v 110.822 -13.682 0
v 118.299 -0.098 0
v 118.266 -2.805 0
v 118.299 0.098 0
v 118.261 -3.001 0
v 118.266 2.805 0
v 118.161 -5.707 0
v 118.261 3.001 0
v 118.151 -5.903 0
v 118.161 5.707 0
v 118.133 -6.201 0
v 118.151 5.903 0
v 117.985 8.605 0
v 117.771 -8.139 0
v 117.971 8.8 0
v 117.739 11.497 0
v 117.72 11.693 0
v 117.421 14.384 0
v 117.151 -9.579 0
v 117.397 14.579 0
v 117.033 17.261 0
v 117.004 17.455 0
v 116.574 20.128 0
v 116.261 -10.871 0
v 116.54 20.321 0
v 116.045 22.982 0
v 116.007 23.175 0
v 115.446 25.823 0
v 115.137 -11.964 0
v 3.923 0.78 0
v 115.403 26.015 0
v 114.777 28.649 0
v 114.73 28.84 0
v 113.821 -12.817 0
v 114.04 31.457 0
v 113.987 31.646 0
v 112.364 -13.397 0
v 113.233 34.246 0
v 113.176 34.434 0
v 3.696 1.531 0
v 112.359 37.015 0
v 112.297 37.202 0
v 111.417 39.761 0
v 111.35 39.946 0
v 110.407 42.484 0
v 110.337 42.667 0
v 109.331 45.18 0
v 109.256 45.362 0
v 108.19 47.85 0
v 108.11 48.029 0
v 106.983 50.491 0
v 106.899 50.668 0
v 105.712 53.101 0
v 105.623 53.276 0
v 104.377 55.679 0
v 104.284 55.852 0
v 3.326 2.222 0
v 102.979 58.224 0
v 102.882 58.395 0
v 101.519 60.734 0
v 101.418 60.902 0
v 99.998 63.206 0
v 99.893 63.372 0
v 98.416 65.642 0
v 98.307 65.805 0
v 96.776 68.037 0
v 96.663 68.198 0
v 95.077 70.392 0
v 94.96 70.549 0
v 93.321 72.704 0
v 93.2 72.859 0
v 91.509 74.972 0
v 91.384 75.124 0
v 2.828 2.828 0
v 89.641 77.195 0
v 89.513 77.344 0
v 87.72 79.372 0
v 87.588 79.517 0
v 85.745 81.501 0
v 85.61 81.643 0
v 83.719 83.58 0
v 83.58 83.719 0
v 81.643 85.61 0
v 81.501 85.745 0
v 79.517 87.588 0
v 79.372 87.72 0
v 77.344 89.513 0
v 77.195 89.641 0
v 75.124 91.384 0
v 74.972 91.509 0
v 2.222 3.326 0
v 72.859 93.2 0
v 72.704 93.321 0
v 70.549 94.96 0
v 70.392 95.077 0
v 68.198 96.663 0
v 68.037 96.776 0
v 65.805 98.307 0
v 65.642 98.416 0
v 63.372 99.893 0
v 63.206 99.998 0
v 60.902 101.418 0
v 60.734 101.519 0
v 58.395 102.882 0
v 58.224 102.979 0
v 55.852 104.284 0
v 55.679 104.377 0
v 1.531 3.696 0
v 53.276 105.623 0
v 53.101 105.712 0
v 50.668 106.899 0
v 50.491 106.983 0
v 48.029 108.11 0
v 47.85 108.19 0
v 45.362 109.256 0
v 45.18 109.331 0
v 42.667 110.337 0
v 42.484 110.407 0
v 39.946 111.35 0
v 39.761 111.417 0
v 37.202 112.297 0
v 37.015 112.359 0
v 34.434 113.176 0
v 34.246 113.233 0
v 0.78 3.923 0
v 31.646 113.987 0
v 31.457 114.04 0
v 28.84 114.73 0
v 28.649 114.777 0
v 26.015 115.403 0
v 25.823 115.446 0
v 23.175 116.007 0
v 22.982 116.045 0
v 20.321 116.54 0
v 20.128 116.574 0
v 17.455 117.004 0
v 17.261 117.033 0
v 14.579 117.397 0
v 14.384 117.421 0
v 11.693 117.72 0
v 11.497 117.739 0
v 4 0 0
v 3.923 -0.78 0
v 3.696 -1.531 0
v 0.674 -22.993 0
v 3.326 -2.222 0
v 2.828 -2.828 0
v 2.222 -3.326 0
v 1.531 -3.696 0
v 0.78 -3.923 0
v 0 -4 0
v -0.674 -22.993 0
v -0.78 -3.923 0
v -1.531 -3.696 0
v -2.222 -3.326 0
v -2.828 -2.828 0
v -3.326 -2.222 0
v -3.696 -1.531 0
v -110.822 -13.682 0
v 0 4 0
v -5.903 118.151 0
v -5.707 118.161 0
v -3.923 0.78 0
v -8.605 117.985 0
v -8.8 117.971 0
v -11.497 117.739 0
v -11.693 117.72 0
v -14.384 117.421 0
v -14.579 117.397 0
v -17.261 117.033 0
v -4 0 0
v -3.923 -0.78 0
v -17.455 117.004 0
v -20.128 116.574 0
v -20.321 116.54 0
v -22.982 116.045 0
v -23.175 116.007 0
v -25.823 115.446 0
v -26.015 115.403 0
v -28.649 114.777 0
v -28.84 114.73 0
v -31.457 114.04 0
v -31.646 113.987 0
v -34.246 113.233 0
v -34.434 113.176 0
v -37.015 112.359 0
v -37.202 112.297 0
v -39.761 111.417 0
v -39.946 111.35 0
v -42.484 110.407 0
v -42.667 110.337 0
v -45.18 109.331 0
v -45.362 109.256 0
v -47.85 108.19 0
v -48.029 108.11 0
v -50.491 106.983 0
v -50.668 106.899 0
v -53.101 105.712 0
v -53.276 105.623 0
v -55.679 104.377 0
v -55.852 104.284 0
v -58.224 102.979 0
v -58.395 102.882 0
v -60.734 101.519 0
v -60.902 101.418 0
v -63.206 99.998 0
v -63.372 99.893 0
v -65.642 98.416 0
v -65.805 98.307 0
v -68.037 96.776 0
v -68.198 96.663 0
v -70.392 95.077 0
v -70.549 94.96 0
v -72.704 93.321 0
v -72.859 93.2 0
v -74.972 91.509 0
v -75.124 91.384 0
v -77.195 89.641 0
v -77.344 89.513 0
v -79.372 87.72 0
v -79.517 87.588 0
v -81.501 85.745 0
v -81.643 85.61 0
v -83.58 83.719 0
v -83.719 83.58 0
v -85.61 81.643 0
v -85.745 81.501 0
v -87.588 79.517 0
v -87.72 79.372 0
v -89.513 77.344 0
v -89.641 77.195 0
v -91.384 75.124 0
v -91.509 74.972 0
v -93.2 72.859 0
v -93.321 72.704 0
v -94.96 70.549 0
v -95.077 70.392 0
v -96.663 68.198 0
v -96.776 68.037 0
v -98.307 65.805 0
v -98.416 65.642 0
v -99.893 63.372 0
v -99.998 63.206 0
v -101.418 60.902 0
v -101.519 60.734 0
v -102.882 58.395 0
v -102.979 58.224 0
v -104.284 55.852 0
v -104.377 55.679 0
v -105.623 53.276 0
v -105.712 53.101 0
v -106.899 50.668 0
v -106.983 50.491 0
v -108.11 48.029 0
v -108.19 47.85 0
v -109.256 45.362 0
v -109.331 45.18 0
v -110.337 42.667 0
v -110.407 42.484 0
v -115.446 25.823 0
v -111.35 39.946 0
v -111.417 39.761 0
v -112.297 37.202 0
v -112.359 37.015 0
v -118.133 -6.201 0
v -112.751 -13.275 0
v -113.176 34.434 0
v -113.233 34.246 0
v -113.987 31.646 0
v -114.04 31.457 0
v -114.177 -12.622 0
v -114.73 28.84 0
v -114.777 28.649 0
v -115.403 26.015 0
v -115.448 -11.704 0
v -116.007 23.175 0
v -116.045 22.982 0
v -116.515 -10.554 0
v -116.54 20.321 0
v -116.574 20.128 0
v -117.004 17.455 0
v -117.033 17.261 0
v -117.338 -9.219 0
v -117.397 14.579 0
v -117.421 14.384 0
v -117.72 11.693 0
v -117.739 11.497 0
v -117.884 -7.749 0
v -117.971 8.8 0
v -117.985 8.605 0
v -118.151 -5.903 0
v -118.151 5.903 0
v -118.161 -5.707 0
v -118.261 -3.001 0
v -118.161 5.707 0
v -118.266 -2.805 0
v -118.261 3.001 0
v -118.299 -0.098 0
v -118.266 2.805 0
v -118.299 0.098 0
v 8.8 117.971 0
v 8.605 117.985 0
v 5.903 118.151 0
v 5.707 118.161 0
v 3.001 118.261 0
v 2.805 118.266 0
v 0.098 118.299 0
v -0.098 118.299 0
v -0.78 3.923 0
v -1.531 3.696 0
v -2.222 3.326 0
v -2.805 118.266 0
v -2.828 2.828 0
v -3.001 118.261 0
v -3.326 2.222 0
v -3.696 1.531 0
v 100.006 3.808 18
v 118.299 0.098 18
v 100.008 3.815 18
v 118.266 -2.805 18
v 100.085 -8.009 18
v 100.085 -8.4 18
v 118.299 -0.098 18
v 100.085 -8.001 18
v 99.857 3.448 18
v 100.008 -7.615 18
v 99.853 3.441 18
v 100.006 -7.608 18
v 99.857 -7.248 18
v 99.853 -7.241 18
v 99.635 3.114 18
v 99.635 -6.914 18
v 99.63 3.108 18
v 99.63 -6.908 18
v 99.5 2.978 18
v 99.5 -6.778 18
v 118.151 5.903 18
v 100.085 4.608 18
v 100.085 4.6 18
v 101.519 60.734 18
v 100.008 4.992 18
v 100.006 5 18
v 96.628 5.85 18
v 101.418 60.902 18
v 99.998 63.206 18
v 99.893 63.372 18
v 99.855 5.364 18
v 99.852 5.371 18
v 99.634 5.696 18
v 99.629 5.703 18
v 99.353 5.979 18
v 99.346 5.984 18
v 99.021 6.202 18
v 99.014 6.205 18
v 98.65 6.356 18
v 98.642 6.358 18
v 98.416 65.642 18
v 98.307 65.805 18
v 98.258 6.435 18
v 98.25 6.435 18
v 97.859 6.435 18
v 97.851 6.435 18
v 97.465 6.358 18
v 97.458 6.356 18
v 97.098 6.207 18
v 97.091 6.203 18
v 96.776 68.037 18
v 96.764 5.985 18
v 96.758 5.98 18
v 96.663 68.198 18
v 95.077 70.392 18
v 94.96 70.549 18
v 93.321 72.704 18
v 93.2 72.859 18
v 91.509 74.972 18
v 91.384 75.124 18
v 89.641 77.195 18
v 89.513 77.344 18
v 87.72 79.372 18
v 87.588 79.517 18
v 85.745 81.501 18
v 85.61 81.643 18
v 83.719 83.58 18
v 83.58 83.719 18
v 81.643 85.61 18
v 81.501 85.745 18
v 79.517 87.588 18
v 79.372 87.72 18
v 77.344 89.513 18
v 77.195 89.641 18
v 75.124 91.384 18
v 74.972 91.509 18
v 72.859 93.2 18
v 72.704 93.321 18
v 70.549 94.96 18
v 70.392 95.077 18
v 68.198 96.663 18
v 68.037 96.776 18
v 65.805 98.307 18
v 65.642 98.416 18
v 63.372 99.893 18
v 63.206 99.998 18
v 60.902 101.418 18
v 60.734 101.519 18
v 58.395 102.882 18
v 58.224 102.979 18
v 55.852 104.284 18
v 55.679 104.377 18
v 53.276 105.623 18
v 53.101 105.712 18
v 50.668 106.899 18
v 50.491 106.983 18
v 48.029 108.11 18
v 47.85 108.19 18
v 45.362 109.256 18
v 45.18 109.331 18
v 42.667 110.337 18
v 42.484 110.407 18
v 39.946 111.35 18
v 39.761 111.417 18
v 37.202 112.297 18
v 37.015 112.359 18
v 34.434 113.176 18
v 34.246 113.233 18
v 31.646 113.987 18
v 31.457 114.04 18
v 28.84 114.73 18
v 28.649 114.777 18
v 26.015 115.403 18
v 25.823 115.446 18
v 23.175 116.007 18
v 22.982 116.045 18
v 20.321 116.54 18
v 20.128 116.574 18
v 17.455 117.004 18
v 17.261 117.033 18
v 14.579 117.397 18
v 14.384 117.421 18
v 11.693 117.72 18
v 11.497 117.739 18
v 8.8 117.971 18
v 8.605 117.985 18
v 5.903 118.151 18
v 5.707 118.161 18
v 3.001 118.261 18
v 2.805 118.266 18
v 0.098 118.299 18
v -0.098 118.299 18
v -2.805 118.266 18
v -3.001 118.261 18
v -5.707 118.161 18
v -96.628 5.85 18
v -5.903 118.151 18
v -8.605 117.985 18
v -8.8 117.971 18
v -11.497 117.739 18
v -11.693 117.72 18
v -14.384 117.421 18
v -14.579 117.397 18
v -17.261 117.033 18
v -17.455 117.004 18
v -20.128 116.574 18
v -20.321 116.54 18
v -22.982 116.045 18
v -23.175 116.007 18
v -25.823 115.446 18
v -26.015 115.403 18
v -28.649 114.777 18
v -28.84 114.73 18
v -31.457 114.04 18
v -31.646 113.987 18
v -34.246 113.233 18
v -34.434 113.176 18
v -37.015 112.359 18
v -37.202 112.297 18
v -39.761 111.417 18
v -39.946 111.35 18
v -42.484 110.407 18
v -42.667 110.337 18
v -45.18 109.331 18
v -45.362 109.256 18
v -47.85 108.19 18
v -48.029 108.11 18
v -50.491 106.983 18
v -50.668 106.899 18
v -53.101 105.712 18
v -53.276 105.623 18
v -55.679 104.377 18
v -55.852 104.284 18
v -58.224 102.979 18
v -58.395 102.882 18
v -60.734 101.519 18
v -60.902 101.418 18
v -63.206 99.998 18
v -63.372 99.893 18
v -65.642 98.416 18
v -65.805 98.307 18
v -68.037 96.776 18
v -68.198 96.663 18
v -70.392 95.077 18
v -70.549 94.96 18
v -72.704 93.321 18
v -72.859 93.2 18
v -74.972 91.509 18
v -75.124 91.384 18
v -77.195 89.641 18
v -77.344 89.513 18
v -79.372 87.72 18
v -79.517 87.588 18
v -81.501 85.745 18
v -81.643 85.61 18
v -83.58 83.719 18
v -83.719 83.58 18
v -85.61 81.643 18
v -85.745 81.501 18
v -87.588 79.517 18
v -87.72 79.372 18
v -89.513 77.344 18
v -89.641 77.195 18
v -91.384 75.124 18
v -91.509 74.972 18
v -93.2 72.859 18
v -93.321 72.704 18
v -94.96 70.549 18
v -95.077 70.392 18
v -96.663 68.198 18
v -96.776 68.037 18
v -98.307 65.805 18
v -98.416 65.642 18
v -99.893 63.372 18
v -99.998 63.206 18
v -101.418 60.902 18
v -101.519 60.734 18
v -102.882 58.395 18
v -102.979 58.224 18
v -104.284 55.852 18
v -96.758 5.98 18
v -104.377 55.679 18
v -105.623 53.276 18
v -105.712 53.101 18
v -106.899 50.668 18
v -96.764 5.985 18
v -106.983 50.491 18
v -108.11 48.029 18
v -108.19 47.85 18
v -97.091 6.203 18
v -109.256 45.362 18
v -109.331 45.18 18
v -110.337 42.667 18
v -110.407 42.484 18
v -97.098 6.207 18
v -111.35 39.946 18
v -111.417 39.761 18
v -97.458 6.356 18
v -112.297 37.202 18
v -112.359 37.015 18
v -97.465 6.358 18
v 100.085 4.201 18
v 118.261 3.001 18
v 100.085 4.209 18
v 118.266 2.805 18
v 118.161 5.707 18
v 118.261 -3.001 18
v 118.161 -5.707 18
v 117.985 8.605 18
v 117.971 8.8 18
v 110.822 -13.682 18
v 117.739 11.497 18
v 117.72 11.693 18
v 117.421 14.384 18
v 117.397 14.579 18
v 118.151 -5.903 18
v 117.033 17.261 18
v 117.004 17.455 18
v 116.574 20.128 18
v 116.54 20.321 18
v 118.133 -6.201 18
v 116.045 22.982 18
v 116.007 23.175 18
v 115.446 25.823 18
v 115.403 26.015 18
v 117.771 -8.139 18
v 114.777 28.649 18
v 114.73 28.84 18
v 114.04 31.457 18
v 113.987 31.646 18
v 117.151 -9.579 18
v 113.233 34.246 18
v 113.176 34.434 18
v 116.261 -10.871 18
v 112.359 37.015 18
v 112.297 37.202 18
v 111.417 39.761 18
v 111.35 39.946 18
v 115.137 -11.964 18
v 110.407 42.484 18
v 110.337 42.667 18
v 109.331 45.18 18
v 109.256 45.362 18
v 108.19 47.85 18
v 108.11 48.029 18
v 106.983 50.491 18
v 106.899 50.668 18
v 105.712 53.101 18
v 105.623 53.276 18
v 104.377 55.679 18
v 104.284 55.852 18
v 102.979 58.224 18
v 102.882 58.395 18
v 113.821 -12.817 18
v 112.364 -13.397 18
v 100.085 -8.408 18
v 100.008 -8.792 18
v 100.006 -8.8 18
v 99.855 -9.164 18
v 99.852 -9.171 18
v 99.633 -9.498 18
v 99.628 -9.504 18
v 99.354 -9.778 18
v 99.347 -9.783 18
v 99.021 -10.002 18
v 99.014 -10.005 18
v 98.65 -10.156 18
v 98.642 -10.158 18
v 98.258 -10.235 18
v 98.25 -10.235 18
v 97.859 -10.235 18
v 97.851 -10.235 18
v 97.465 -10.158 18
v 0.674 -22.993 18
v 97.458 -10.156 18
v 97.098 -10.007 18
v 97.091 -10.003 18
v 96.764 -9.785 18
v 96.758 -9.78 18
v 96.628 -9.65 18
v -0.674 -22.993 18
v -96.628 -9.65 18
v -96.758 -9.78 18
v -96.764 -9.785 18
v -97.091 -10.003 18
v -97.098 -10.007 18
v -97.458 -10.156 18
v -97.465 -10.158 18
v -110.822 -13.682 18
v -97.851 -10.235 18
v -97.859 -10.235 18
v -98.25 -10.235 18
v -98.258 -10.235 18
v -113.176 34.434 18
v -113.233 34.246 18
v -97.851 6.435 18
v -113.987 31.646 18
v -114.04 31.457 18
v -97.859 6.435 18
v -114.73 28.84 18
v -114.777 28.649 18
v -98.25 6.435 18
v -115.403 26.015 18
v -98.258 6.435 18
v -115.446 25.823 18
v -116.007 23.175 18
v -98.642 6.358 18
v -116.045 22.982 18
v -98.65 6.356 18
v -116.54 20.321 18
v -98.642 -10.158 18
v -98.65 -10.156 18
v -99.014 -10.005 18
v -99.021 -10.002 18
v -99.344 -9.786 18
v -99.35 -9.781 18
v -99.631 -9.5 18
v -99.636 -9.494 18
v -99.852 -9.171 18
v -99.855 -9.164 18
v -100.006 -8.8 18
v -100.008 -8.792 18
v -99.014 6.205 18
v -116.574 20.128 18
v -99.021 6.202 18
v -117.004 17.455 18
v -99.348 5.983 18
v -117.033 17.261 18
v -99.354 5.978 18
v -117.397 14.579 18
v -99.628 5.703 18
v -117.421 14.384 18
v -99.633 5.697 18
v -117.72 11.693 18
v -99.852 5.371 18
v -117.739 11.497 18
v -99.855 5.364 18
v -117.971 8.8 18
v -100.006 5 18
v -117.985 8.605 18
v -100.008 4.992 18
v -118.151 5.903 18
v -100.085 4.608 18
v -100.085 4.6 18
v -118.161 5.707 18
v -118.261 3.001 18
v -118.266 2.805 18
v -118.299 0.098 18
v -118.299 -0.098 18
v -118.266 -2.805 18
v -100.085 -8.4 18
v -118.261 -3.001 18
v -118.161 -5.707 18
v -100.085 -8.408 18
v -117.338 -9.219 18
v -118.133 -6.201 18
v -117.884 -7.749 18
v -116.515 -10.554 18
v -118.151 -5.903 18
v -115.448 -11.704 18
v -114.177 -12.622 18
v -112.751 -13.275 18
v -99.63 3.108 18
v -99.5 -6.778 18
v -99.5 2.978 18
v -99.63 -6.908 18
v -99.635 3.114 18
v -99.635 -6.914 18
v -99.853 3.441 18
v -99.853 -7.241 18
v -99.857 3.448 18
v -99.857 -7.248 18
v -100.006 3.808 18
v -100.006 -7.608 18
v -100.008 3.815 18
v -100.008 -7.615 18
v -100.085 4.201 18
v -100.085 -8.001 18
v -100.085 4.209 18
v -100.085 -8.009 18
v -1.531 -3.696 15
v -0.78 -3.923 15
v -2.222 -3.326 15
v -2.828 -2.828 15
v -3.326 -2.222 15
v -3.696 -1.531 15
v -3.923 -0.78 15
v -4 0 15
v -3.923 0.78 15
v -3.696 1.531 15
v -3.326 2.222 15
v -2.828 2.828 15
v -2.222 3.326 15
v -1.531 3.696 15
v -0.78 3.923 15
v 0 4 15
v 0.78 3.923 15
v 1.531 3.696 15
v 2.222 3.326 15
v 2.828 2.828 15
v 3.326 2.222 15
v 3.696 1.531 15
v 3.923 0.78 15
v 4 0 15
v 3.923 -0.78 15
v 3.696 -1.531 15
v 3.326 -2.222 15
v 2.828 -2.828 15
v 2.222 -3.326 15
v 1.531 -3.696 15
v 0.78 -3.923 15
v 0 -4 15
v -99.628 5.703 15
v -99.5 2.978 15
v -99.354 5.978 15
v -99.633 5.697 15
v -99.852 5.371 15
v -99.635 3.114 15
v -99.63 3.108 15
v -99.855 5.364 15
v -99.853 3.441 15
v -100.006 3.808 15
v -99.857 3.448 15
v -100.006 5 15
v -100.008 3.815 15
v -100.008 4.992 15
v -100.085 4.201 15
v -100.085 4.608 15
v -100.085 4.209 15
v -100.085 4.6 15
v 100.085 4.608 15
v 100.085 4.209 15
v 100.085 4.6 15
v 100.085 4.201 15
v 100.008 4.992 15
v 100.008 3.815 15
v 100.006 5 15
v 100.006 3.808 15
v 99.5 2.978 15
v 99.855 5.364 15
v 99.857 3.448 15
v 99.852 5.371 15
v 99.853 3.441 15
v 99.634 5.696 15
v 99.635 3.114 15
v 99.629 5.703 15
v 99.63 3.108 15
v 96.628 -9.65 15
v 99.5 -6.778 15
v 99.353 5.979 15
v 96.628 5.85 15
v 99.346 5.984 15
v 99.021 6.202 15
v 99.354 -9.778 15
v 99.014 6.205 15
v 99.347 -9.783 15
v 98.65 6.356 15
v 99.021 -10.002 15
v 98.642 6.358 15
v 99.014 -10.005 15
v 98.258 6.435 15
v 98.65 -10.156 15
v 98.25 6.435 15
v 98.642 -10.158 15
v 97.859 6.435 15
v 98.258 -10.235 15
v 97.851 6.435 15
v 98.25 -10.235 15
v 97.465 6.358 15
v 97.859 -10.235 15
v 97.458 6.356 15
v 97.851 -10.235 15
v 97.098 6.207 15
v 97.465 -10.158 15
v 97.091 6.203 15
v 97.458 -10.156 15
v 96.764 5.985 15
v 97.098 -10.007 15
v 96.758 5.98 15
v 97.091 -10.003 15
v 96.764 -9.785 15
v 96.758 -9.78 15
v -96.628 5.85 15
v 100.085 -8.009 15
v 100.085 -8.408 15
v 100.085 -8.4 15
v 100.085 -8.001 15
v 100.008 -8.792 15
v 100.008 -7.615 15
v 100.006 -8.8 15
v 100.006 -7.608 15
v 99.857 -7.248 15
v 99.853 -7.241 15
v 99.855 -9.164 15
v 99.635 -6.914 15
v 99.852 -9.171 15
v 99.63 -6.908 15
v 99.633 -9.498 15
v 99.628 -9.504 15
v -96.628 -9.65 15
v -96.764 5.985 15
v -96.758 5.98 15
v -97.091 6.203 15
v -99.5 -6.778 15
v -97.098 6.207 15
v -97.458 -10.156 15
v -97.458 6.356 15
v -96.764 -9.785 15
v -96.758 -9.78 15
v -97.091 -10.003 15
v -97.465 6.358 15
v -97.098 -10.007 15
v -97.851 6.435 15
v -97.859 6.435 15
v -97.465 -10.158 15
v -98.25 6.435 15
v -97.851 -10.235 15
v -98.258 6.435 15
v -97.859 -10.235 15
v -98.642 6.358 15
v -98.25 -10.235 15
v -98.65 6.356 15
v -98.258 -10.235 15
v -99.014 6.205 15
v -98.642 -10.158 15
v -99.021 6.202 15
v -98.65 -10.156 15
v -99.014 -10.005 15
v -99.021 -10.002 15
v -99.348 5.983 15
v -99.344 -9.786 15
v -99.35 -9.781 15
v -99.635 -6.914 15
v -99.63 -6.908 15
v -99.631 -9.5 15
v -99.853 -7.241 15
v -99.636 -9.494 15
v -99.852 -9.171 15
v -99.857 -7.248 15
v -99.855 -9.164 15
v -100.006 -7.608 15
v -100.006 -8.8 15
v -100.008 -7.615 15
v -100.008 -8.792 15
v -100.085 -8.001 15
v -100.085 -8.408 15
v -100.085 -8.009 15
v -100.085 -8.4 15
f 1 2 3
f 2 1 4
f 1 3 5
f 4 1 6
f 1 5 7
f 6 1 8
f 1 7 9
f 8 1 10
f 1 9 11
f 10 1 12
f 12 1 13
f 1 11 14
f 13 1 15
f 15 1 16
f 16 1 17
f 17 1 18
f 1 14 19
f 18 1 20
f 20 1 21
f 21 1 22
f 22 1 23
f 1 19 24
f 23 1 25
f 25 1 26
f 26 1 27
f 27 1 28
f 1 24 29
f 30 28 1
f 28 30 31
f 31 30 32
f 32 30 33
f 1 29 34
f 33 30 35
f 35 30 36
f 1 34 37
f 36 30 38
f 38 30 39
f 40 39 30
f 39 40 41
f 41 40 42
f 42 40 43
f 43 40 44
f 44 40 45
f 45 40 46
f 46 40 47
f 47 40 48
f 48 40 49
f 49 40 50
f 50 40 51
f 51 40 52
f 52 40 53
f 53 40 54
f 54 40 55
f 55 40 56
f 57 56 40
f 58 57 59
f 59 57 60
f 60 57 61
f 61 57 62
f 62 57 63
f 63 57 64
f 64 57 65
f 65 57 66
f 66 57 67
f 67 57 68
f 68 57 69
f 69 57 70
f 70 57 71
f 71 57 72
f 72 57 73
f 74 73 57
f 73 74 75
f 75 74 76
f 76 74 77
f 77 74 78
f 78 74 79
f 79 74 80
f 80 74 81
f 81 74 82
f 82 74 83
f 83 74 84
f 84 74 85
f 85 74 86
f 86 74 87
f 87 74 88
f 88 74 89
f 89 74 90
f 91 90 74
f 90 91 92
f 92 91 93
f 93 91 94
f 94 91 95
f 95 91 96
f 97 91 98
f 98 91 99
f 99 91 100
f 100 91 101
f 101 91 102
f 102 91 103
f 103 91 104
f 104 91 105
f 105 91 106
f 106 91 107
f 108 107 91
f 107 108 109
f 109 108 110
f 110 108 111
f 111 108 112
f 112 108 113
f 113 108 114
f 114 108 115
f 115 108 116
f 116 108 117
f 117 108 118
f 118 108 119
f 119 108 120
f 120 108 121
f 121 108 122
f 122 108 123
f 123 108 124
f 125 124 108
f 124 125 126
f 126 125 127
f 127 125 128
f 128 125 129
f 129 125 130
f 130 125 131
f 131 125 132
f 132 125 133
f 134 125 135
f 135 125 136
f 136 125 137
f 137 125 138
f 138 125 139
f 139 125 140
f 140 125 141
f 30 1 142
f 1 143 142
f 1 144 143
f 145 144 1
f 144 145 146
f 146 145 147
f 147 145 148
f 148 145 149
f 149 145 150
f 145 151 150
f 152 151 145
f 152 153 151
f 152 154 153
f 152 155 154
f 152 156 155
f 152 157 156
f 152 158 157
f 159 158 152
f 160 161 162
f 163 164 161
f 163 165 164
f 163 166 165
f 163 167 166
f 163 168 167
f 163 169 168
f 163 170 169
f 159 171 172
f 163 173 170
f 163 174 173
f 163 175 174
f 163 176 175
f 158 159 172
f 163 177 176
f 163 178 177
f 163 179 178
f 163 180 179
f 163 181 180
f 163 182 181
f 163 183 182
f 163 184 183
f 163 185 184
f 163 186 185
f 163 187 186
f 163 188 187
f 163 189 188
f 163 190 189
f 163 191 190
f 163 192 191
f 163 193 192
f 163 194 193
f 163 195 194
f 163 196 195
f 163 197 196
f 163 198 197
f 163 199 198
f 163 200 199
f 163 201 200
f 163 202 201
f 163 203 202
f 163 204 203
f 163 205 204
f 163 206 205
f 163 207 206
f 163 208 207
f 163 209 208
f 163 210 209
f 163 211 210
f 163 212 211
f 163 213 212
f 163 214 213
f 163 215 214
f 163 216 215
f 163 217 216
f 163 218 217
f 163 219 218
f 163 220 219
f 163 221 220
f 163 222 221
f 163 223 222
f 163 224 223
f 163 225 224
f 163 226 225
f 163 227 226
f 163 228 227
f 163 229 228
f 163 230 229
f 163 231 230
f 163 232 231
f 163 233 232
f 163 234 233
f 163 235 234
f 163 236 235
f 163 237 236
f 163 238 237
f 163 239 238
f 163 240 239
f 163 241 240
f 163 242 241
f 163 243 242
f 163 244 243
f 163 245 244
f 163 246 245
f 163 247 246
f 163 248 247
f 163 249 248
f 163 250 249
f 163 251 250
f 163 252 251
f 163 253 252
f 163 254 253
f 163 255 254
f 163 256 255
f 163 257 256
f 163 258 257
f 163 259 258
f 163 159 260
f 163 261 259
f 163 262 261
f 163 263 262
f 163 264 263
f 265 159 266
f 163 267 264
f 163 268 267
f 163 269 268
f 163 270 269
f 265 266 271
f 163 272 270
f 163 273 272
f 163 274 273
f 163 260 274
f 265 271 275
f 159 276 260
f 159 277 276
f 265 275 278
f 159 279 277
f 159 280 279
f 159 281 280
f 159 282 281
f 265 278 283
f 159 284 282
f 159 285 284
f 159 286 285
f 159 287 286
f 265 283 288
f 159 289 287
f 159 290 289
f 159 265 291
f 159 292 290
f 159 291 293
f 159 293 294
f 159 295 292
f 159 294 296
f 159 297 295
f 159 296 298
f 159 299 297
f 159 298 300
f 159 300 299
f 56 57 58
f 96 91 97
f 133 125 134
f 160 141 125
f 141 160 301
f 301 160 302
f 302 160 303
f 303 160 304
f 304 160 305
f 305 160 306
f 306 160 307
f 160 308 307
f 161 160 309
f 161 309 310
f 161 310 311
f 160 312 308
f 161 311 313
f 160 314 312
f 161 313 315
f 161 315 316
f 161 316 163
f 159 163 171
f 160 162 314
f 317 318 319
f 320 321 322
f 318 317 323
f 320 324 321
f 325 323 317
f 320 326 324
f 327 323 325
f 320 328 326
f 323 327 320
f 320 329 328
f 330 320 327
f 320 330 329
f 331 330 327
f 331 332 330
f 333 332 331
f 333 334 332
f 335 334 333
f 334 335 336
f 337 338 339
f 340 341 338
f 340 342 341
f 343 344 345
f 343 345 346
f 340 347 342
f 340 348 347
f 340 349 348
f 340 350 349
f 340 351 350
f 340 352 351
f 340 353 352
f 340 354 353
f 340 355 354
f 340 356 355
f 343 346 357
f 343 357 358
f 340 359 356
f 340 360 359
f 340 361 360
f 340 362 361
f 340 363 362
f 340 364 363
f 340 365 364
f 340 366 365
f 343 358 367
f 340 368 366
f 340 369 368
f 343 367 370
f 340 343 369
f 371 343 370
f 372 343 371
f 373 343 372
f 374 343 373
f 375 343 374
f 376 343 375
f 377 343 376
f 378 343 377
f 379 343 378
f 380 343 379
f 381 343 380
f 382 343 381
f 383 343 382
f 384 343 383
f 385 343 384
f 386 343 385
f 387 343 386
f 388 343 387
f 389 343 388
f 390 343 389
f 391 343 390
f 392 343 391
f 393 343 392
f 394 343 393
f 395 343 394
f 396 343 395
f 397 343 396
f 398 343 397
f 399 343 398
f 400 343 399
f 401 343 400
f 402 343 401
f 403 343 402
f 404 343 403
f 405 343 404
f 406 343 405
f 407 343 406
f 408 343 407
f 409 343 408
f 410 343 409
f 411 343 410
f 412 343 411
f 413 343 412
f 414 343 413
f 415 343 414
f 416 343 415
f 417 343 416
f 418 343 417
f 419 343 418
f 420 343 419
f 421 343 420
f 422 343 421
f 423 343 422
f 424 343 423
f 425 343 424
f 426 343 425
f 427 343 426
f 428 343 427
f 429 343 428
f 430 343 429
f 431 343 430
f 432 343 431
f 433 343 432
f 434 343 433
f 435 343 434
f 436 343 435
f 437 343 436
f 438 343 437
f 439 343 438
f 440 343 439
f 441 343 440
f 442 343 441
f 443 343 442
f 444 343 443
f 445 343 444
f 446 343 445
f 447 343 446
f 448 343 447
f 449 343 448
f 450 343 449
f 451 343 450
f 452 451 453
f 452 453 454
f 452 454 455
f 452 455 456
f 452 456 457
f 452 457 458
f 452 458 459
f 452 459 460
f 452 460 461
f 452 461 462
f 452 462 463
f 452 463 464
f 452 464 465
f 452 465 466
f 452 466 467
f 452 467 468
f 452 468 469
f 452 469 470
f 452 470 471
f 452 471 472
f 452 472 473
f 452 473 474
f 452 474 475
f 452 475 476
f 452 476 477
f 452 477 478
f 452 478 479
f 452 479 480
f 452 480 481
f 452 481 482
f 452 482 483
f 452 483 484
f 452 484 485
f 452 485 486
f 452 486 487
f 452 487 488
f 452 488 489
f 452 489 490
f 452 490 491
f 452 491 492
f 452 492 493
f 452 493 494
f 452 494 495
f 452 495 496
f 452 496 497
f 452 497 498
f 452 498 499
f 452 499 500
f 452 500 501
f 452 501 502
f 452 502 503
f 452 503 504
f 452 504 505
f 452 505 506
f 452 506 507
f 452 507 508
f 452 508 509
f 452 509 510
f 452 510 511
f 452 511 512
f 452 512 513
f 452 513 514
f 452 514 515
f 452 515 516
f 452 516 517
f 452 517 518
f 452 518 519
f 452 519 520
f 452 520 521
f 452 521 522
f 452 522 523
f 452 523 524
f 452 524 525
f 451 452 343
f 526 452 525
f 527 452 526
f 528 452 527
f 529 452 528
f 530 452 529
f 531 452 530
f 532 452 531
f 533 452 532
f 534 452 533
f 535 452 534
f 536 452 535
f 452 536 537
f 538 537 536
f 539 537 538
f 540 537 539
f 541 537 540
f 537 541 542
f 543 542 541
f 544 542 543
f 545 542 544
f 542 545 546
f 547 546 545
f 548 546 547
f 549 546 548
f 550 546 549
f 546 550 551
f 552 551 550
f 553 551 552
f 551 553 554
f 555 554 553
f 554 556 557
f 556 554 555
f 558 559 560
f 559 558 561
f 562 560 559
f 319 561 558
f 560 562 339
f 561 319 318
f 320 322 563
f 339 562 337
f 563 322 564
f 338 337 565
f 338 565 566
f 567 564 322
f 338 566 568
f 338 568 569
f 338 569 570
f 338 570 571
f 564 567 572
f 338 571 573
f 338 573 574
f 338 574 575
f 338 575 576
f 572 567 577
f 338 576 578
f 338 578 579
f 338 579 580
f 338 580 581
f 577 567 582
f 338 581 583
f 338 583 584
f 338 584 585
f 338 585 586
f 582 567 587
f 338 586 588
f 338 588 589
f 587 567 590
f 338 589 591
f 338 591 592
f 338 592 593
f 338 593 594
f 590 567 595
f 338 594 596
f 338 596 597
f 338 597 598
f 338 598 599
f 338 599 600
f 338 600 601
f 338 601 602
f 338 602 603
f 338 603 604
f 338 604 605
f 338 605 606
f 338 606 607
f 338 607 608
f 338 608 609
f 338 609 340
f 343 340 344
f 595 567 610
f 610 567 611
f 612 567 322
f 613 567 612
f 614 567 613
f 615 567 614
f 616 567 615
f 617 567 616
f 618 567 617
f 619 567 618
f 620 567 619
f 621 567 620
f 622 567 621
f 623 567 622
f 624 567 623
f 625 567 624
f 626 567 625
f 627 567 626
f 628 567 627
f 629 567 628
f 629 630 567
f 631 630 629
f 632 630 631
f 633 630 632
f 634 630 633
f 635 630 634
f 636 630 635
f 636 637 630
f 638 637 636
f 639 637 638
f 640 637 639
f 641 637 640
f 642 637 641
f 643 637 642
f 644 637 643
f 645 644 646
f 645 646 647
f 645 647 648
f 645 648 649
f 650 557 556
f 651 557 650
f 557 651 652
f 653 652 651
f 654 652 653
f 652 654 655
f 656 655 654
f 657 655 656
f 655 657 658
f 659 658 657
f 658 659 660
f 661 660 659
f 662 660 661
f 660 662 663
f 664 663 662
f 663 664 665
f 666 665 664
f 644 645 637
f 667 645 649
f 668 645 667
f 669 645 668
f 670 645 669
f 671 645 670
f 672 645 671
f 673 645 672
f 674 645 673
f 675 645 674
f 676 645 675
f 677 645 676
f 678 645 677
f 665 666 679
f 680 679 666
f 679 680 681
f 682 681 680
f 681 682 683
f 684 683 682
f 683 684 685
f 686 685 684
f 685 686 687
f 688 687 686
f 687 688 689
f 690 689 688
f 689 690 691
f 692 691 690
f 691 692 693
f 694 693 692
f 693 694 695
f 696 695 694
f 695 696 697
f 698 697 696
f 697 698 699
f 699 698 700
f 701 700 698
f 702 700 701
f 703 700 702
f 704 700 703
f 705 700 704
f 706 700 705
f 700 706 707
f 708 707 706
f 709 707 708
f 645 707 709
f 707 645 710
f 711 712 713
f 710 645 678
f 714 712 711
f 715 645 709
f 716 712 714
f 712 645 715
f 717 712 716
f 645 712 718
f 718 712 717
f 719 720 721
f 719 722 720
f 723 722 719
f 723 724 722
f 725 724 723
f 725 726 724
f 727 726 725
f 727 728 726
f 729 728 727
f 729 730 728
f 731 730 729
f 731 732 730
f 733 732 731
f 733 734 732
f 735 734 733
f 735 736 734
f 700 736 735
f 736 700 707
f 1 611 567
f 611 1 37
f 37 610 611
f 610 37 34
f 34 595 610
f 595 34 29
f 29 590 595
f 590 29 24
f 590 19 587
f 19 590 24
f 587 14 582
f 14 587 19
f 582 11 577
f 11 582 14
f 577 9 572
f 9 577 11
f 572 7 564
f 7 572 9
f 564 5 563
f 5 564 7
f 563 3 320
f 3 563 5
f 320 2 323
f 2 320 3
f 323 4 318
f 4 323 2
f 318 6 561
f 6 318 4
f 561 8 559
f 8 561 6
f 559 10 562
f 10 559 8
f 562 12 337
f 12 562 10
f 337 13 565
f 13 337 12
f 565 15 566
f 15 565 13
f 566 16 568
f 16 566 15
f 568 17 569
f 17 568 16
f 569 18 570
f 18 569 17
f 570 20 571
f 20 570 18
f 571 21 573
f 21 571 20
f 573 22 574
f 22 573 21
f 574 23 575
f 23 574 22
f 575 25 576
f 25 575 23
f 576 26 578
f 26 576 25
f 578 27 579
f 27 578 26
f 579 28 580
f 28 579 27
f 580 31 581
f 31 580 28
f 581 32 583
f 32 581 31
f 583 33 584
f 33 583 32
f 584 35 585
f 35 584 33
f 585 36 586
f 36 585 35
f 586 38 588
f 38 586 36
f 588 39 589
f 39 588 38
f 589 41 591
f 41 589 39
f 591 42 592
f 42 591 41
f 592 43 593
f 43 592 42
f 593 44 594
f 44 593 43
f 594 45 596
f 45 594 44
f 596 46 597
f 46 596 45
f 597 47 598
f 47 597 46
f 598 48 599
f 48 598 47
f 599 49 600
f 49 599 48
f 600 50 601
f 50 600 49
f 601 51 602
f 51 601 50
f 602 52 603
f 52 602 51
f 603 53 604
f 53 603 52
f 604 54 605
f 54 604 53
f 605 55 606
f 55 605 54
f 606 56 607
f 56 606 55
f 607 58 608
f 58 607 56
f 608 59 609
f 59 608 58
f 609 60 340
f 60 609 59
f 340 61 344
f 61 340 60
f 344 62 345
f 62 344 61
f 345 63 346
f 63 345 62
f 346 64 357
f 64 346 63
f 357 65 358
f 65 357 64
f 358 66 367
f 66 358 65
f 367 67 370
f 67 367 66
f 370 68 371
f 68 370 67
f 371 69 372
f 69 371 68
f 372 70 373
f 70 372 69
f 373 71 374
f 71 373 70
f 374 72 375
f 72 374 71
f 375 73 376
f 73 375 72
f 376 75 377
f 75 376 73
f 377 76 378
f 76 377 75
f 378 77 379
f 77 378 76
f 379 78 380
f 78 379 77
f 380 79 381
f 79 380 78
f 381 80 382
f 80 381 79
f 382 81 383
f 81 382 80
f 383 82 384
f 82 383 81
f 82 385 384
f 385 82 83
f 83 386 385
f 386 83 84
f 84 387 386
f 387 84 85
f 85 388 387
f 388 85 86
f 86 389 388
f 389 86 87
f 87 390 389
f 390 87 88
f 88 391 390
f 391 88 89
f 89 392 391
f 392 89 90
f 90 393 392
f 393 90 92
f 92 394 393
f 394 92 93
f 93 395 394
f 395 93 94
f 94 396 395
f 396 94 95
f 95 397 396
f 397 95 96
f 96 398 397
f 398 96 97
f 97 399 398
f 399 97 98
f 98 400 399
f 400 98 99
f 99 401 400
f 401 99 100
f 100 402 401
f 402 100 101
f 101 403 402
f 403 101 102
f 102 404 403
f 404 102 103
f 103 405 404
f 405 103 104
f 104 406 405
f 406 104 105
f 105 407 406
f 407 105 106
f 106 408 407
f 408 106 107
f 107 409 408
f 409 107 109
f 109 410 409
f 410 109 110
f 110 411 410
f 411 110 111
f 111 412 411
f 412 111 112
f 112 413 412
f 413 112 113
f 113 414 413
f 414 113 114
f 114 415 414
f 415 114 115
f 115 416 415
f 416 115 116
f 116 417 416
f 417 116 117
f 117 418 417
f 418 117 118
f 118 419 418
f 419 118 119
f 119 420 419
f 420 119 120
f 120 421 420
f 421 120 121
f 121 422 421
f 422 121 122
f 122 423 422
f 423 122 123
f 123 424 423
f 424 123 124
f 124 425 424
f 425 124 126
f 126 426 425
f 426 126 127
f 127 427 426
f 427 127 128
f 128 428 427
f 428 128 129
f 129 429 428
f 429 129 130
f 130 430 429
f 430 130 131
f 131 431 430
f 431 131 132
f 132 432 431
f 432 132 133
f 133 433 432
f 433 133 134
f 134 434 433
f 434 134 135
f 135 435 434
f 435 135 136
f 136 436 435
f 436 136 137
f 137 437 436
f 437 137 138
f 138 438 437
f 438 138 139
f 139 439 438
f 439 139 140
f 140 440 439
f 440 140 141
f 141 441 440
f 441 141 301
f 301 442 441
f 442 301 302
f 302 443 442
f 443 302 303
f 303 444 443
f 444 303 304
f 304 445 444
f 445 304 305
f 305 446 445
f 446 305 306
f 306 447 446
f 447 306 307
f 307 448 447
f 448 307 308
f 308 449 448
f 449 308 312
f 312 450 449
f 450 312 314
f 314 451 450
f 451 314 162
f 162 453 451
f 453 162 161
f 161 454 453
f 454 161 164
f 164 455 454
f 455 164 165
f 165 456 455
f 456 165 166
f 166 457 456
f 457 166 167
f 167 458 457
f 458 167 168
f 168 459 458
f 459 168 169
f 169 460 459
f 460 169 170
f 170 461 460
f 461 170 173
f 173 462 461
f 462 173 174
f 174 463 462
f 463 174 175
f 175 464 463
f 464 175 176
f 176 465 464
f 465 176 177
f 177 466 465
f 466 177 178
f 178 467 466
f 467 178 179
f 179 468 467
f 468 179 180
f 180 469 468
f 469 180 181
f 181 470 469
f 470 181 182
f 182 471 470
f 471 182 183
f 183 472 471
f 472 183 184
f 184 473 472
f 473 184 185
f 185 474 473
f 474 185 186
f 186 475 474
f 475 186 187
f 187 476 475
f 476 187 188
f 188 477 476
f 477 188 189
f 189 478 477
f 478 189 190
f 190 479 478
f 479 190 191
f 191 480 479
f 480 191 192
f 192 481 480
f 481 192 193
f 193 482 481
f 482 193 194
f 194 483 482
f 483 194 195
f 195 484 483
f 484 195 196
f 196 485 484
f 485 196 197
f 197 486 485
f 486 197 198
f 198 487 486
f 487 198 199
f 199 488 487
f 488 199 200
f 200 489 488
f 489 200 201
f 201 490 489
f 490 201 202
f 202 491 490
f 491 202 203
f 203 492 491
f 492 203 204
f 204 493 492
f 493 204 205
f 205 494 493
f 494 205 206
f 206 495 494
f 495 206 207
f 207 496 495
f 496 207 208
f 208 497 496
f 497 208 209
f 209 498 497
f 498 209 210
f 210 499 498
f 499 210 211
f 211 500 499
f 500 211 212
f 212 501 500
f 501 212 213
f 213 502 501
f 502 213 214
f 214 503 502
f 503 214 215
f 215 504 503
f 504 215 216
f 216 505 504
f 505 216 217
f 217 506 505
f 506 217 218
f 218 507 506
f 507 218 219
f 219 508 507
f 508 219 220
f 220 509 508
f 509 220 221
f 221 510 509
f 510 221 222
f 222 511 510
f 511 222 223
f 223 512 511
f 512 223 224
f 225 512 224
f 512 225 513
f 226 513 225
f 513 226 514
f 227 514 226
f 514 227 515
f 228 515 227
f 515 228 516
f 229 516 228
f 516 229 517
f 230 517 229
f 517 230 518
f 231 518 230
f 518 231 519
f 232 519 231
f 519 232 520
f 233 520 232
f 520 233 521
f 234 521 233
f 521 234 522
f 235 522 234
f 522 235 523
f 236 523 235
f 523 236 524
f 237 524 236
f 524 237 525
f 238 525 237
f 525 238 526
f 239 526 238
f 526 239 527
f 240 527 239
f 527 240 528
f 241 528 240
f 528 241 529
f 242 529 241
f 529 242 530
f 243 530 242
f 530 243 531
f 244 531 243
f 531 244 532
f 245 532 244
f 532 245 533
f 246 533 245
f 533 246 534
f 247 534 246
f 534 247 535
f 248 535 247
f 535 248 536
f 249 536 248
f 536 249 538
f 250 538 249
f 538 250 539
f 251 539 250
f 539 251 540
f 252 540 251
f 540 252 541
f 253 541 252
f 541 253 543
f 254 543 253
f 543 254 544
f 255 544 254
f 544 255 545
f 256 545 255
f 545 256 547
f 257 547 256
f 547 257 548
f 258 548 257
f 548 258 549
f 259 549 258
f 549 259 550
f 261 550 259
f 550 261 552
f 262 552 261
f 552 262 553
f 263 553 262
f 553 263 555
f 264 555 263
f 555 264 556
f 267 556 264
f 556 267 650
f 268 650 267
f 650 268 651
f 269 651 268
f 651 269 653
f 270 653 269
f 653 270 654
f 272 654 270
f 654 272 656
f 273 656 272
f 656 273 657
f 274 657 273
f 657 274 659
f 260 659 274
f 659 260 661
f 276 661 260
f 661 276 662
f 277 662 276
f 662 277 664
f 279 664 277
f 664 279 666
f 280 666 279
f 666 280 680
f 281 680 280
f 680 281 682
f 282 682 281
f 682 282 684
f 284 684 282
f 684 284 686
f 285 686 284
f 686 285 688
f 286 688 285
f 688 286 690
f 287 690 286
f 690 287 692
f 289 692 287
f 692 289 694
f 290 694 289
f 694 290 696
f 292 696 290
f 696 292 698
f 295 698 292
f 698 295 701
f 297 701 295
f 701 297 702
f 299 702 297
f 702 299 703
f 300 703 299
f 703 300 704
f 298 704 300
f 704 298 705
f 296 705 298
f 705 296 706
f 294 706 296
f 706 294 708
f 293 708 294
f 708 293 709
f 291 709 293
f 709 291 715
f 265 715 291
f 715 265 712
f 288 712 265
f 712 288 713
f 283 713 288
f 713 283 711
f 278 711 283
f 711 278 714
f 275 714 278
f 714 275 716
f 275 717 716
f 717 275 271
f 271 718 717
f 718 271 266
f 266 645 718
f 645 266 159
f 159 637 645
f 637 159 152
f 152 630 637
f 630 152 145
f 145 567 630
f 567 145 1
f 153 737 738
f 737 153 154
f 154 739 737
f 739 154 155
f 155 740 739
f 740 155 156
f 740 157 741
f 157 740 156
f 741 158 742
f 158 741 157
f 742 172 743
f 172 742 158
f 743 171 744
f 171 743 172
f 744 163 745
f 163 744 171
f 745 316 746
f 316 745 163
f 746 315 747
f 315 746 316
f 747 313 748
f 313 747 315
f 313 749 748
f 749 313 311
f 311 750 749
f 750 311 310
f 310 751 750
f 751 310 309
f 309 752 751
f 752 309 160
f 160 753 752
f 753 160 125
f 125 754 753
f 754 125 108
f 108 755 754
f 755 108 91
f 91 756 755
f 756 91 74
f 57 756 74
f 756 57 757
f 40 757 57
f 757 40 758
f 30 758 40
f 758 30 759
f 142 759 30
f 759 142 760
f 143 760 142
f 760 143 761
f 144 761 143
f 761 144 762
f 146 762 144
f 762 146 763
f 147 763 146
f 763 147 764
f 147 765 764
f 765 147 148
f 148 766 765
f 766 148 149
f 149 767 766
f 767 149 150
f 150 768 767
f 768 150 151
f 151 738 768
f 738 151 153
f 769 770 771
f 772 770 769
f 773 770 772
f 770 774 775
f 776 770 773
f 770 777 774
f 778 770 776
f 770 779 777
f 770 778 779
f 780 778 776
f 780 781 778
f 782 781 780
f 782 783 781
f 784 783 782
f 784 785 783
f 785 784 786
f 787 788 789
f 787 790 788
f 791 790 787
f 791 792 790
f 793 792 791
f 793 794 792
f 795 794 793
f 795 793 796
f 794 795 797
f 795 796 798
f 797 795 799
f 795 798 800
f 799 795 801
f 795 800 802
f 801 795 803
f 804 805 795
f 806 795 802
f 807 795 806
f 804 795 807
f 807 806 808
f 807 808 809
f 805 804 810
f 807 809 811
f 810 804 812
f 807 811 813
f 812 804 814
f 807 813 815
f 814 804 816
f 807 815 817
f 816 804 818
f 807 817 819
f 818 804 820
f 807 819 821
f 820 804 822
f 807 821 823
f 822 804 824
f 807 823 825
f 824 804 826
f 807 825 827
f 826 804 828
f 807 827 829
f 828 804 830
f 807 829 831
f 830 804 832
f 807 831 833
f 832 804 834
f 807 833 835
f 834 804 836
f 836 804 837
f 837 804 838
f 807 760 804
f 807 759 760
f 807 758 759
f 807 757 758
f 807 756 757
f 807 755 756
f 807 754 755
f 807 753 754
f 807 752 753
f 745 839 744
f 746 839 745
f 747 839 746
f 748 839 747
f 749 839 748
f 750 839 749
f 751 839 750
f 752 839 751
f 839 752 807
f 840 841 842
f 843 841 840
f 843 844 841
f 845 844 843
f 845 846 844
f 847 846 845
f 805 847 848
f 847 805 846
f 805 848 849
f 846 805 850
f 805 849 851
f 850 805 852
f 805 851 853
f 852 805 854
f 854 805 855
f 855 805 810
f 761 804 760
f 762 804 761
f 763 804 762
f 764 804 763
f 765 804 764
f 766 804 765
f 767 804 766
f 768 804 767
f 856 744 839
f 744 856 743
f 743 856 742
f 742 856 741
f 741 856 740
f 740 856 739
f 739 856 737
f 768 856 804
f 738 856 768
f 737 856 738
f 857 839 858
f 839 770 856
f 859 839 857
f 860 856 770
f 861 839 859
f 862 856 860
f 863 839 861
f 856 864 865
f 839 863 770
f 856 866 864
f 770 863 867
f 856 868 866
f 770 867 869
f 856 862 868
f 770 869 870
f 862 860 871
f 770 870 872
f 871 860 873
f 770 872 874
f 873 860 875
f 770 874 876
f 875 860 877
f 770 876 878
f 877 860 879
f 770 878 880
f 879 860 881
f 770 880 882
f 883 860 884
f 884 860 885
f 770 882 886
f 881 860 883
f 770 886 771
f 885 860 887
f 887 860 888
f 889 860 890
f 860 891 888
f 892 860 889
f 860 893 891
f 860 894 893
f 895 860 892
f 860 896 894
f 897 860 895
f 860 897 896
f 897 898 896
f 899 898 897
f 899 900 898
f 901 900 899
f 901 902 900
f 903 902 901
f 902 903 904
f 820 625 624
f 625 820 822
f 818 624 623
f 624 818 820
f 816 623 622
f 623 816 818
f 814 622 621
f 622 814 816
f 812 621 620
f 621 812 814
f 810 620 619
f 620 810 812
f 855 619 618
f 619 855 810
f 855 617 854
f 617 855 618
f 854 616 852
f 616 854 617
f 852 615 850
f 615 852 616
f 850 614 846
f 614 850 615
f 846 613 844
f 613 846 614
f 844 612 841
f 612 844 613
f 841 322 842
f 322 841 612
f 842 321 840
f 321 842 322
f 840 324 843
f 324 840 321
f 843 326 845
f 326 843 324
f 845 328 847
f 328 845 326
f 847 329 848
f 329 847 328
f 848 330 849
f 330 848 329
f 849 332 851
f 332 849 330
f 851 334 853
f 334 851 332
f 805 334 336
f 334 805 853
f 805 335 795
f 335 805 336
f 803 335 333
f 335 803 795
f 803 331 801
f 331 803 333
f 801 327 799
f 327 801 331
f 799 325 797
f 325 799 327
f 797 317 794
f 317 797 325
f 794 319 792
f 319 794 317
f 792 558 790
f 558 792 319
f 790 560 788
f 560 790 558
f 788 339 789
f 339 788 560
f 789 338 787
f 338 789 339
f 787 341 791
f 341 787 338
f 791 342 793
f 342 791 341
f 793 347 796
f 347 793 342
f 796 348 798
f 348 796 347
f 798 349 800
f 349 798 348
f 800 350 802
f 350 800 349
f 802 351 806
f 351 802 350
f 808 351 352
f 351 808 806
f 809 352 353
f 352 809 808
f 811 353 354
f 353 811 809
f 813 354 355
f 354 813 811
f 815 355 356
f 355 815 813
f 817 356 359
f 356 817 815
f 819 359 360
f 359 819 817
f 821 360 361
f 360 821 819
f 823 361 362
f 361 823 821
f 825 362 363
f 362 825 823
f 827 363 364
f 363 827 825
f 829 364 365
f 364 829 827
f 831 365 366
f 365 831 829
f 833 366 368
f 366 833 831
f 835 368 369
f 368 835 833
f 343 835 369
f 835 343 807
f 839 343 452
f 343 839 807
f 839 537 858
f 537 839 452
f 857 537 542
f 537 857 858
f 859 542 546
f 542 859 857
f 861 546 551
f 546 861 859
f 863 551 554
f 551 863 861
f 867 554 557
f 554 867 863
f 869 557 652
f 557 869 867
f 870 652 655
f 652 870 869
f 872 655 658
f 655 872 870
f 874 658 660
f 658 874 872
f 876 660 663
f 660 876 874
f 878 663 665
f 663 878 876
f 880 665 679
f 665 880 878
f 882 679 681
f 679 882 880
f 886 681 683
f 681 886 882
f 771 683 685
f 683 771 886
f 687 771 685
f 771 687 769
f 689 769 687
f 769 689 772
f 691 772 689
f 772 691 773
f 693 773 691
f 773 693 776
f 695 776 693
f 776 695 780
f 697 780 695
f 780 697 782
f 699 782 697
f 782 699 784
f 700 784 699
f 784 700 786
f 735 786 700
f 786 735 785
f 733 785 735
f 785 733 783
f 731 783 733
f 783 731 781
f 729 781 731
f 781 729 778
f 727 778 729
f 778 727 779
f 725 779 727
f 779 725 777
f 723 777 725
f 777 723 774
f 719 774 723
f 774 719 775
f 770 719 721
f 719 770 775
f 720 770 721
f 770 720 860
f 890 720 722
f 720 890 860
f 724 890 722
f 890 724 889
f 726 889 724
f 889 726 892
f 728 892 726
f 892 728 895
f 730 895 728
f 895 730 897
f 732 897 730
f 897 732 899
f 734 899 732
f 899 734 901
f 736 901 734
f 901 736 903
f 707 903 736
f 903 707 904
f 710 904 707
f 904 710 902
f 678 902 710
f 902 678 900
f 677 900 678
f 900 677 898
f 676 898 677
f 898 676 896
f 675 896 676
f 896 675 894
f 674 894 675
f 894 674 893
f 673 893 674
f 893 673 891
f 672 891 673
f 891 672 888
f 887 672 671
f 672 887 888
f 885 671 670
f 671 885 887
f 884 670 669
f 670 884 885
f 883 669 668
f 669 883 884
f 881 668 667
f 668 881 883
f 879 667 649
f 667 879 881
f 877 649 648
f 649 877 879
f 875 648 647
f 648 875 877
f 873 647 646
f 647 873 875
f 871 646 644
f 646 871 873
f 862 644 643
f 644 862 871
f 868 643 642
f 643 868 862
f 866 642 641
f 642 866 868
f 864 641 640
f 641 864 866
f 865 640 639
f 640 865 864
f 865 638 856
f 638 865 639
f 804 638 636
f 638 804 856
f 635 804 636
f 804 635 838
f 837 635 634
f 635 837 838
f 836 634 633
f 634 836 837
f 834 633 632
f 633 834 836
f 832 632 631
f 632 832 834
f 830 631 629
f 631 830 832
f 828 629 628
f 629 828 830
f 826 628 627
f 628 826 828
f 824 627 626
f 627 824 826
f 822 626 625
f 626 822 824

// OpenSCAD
// file: volleyball_pole_rack.scad
back_thickness = 18.05;
back_rabbet = 4;
vertical_thickness = 18.05;
lip_size = 4;

pole_dia = 3.75 * 25.4;
pole_spacing = vertical_thickness*2+10;

edge_spacing = 16;

w = pole_dia*2 + pole_spacing + lip_size * 3 + vertical_thickness;
h = back_thickness + lip_size + pole_dia;
inner_height = 40;
back_width = w + pole_dia;


module Profile() {
  difference() {
    translate([-back_width/2,0]) square([back_width,h]);
    for(x_scale=[1,-1]) scale([x_scale,1])
      for(x=[(pole_dia+pole_spacing)/2+lip_size, (pole_dia+pole_spacing)/2+vertical_thickness+pole_dia+lip_size*3])
        translate([x,0]) hull() {
      for(y=[pole_dia/2+back_thickness+lip_size,pole_dia+back_thickness+lip_size])
      translate([0,y])
        circle(d=pole_dia,$fn=256);
    }
  }
}

module Rabbets() {
  for(x_scale=[1,-1]) scale([x_scale,1]) {
    translate([pole_spacing/2+pole_dia+lip_size*2,0]) square([vertical_thickness,h+4]);
    translate([-pole_spacing/2,0]) square([vertical_thickness,h+4]);
  }
  translate([-back_width/2-4,0]) square([back_width+8,back_thickness]);
  translate([-pole_spacing/2,h-back_thickness])
    square([pole_spacing,back_thickness+4]);
}

module RabbetsHole() {
  t = pole_spacing-vertical_thickness*2;
  translate([-t/2,back_thickness]) square([t,h-back_thickness*2]);
}

module SpikeBox(dims, cutter_dia) {
  off = 0.78 * cutter_dia / 2;
  translate([dims[0]/2,0]) {
    square(dims, center=true);
    for(x_scale=[1,-1], y_scale=[1,-1])
      translate([(dims[0]/2-off)*x_scale, (dims[1]/2-off)*y_scale])
      circle(d=cutter_dia,$fn=64);
  }
}

module Vertical(center_cutout=true) {
  difference() {
    square([h-back_thickness-(center_cutout?vertical_thickness-back_rabbet:0)+back_rabbet,inner_height]);
  }
}

module Back() {
  difference() {
    translate([-back_width/2,0]) square([back_width,inner_height]);
    translate([0,inner_height/2]) circle(d=8,$fn=32);
    for(x_scale=[1,-1]) scale([x_scale,1]) {
      translate([(pole_dia+pole_spacing)/3,inner_height/2]) circle(d=6,$fn=32);
      translate([pole_dia+pole_spacing+vertical_thickness+lip_size*3,inner_height/2]) circle(d=6,$fn=32);
    }

    for(x_scale=[1,-1]) translate([16*25.4/2*x_scale,inner_height/2]) circle(d=6,$fn=32);
  }
}

module BackRabbets() {
  intersection() {
    translate([0,-30]) Rabbets();
    translate([-back_width/2,-5]) square([back_width,inner_height+10]);
  }
}

module Spinner() {
  r=pole_dia+pole_spacing/2;
  difference() {
    offset(r=8,$fn=32) offset(delta=-8) intersection() {
      circle(r=r,$fn=256);
      hull() {
        circle(d=pole_spacing,$fn=32);
        translate([r,10]) circle(d=pole_spacing,$fn=32);
        translate([-r,10]) circle(d=pole_spacing,$fn=32);
        translate([r,r]) circle(d=pole_spacing,$fn=32);
        translate([-r,r]) circle(d=pole_spacing,$fn=32);
      }
    }
    circle(d=8,$fn=32);
  }
}

module HBone(_w,_h,d) {
  _t=1.41*d/4;
  square([_w,_h]);
  for(x=[_t,_w-_t])
  for(y=[_t,_h-_t])
    translate([x,y]) circle(d=d,$fn=32);
}

module SpinnerPocket() {
  translate([-199/2,-19.3/2]) HBone(199,15.5,4.1);
}

module Front() {
  intersection() {
    Back();
    translate([-pole_spacing/2,0]) square([pole_spacing, inner_height]);
  }
}

module FrontRabbets() {
  intersection() {
    BackRabbets();
    translate([-pole_spacing/2,-5]) square([pole_spacing,inner_height+10]);
  }
}
// main file
include <volleyball_pole_rack.scad>;

difference() {
  linear_extrude(height=18) Spinner();
  #translate([0,0,18-3]) linear_extrude(height=10,convexity=10) offset(r=2,$fn=32) offset(delta=-2) SpinnerPocket();
}
